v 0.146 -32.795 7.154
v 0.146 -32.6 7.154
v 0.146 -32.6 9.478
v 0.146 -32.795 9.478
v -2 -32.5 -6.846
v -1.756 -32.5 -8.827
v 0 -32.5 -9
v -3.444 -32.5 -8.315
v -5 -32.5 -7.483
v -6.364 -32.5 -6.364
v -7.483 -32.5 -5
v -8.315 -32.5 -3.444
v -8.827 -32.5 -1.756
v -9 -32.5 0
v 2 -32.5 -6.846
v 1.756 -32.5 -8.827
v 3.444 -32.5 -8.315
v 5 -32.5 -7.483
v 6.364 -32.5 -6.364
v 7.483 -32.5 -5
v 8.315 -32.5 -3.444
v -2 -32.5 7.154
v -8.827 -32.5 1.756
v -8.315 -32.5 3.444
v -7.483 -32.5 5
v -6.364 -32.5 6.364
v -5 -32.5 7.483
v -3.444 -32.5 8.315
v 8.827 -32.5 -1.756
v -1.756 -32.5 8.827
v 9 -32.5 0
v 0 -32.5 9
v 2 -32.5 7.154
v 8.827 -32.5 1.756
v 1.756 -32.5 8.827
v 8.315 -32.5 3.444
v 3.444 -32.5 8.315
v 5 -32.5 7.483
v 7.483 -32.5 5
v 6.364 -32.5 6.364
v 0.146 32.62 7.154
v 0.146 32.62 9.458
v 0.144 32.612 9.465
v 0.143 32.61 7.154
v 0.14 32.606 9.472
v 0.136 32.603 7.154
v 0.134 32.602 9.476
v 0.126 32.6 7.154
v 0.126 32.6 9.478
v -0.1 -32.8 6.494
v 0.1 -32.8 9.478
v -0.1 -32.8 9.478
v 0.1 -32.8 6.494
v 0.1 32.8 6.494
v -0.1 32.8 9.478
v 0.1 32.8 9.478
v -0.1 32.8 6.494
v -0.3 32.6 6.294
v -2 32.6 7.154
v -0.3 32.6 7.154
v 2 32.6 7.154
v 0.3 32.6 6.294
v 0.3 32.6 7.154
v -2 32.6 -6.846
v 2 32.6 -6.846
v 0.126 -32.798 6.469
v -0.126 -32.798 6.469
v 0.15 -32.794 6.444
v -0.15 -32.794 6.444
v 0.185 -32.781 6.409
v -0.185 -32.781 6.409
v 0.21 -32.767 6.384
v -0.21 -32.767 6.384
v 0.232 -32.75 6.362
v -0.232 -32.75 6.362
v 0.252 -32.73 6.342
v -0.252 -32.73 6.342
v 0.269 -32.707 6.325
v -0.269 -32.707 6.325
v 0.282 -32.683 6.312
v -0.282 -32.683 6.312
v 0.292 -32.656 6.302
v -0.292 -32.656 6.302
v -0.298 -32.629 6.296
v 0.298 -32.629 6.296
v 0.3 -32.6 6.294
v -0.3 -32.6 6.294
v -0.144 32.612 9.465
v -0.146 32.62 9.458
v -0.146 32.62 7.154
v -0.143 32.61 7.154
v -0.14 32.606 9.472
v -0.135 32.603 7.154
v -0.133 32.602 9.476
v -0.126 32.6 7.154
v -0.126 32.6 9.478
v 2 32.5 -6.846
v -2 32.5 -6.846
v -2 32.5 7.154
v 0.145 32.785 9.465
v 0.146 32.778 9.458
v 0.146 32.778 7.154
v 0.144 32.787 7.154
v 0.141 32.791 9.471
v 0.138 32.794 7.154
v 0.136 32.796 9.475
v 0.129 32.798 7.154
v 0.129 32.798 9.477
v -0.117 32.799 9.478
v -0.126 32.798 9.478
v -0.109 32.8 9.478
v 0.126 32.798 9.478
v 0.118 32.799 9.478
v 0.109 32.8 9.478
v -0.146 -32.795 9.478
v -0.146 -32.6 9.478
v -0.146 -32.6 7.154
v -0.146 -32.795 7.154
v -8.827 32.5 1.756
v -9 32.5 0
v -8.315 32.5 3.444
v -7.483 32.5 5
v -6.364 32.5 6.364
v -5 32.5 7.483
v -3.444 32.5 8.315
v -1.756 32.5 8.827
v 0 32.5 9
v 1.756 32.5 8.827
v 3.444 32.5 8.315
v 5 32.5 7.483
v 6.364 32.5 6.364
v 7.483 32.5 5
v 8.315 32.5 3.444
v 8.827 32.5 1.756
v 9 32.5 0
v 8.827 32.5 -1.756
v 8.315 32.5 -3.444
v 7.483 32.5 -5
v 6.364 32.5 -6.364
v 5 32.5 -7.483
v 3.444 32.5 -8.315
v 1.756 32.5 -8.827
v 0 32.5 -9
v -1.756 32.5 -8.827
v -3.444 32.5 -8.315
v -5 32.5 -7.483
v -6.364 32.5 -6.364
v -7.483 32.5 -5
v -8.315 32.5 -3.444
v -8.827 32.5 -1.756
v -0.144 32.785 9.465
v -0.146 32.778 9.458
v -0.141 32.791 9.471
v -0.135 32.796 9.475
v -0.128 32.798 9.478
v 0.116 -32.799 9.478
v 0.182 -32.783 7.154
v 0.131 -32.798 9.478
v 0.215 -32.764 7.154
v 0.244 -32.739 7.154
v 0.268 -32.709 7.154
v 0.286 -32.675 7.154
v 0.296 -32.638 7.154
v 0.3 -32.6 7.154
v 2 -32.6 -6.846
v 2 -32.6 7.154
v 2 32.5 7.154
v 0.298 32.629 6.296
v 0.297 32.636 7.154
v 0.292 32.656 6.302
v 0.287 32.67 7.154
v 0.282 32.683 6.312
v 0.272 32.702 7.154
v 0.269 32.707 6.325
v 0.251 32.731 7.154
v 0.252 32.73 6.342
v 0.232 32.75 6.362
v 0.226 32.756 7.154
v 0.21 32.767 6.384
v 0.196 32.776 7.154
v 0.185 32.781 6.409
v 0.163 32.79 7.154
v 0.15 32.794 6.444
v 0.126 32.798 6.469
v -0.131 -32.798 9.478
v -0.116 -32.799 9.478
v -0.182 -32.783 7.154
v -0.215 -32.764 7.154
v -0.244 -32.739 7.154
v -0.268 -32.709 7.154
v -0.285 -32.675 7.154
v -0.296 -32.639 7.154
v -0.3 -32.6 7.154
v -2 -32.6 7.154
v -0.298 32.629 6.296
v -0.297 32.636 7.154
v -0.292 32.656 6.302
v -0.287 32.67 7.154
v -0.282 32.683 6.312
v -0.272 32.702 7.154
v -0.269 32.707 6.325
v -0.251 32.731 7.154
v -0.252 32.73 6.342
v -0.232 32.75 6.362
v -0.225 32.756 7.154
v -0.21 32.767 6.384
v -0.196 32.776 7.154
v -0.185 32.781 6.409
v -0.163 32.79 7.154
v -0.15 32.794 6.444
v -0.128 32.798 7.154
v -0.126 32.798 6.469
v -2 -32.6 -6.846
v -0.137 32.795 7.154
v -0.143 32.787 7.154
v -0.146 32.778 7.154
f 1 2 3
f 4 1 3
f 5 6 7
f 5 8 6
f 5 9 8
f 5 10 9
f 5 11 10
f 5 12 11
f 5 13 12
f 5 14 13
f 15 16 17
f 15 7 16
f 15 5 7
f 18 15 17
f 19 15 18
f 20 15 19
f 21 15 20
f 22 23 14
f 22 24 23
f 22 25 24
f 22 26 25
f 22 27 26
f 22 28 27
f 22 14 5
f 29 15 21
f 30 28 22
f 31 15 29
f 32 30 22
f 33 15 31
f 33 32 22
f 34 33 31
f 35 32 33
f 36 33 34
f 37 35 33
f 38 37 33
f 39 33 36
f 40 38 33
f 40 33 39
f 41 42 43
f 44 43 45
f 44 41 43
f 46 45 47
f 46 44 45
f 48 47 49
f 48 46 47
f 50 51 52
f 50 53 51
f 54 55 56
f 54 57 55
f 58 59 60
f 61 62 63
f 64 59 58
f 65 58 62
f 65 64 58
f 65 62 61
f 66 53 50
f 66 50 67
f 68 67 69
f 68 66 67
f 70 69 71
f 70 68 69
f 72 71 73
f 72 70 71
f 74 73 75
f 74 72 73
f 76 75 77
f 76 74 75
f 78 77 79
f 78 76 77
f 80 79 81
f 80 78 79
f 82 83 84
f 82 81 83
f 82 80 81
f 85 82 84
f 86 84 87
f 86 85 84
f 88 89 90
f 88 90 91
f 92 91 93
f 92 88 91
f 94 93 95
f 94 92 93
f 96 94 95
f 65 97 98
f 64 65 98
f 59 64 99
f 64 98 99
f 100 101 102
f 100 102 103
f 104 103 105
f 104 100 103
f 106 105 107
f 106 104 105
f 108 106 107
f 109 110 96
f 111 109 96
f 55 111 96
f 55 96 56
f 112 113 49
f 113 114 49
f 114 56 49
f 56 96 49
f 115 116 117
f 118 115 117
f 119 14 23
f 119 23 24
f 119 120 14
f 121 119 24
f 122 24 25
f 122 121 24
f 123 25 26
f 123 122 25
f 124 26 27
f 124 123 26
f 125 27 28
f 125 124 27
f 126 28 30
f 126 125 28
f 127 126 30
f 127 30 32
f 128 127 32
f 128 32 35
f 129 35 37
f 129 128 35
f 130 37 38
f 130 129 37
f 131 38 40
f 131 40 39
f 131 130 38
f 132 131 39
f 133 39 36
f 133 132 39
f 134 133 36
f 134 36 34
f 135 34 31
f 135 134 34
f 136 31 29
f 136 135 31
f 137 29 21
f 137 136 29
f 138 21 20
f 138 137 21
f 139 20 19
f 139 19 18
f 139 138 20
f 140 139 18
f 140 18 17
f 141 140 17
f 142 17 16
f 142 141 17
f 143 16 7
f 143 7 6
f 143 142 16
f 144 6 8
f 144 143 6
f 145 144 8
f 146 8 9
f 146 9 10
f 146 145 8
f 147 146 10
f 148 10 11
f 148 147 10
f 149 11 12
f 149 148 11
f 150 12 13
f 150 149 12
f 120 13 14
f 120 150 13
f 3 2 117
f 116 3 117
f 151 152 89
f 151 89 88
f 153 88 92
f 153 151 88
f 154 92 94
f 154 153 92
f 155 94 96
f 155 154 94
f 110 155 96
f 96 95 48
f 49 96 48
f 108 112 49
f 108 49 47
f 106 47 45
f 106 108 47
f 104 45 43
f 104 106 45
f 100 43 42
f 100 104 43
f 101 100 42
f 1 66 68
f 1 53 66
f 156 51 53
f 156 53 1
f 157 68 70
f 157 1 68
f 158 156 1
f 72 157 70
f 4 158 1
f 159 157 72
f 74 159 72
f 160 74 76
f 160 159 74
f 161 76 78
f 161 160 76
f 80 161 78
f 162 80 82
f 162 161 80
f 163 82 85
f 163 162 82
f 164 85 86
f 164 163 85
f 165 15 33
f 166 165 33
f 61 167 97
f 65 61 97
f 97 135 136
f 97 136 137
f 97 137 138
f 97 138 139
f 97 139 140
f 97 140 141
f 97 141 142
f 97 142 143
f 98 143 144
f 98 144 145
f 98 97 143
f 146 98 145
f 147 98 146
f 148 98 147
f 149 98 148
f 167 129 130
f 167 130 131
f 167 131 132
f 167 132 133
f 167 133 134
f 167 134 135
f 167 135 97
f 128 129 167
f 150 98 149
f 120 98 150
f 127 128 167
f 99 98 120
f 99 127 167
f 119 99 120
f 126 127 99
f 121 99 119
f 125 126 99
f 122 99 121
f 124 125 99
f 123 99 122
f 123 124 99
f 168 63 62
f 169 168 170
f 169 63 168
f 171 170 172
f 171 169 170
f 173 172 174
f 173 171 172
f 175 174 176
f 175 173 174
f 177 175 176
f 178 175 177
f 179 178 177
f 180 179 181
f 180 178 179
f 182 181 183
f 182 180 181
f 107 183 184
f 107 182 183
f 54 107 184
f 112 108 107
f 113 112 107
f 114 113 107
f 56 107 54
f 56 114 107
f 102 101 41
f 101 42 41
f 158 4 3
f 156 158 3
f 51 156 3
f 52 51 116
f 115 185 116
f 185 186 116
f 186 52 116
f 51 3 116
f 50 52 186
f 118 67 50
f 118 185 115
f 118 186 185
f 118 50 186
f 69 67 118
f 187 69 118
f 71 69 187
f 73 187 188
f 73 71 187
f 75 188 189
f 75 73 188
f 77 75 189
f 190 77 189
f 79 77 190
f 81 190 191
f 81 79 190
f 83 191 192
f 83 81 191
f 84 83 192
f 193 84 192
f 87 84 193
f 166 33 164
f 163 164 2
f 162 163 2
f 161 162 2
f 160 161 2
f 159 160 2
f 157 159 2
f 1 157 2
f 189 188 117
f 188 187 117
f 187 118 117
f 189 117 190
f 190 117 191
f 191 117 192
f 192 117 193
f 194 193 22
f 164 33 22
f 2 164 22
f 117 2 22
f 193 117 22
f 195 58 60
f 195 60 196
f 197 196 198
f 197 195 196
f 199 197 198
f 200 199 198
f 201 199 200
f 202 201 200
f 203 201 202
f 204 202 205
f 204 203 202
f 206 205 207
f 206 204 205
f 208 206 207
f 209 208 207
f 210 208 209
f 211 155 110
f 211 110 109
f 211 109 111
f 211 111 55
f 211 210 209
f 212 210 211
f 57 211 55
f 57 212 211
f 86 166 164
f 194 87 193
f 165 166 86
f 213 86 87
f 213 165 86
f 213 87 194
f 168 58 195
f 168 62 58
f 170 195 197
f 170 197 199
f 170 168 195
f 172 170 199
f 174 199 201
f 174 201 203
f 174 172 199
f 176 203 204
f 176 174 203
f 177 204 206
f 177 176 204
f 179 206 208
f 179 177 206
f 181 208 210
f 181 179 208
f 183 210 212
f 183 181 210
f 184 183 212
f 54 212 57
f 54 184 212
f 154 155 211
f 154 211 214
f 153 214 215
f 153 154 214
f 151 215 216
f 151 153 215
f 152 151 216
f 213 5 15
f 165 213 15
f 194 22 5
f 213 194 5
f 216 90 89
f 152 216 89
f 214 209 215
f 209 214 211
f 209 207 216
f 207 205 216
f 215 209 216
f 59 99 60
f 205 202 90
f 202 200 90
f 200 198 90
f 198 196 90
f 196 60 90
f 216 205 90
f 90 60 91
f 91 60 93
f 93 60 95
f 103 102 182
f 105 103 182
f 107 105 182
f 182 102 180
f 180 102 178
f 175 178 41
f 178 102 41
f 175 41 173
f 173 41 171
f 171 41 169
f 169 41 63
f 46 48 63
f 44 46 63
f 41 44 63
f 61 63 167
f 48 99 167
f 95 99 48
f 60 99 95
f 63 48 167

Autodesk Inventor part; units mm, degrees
ref_plane "YZ Plane" through (0, 0, 0) normal (1, 0, 0) x (0, 1, 0)
ref_plane "XZ Plane" through (0, 0, 0) normal (0, 1, 0) x (-1, 0, 0)
ref_plane "XY Plane" through (0, 0, 0) normal (0, 0, 1) x (1, 0, 0)
sketch "Boceto1" plane through (0, 0, 0) normal (0, 1, 0) x (-1, 0, 0)
  circle A0 centre (0, 0) radius 9
extrude "Extrusión1" add sketch "Boceto1" along normal blind 32.5
sketch "Boceto3" plane through (0, 32.5, 0) normal (0, 1, 0) x (1, 0, 0)
  line L0 (-2, -7.1538) -> (2, -7.1538)
  line L1 (2, -7.1538) -> (2, 6.8462)
  line L2 (2, 6.8462) -> (-2, 6.8462)
  line L3 (-2, 6.8462) -> (-2, -7.1538)
  point P0 (0, 0)
extrude "Extrusión2" add sketch "Boceto3" along normal blind 0.1
sketch "Boceto4" plane through (0, 32.6, 0) normal (0, 1, 0) x (1, 0, 0)
  line L0 (-2, -7.1538) -> (2, -7.1538) projected
  line L1 (-0.3, -7.1538) -> (-0.3, -6.2942)
  line L2 (-0.3, -6.2942) -> (0.3, -6.2942)
  line L3 (0.3, -6.2942) -> (0.3, -7.1538)
  line L4 (-0.1455, -7.1538) -> (-0.1455, -9.4777)
  line L5 (-0.1455, -9.4777) -> (0.146, -9.4777)
  line L6 (0.146, -9.4777) -> (0.146, -7.1538)
  line L7 (-0.3, -7.1538) -> (-0.1455, -7.1538)
  line L8 (0.146, -7.1538) -> (0.3, -7.1538)
  point P0 (0, 0)
extrude "Extrusión3" add sketch "Boceto4" along normal blind 0.2
fillet "Empalme1" radius 0.2 3 edges at (-0.3, 32.8, 6.724) (0.3, 32.8, 6.724) (0, 32.8, 6.2942)
fillet "Empalme2" radius 0.02 6 edges at (-0.1455, 32.6974, 9.4777) (0.146, 32.6974, 9.4777) (-0.1455, 32.6, 8.3158) (0.146, 32.6, 8.3158) (0.146, 32.7947, 8.3158) (-0.1455, 32.7949, 8.3158)
mirror "Simetría1" about plane through (0, 0, 0) normal (0, -1, 0) of "Extrusión1", "Extrusión3", "Extrusión2", "Empalme1"
equation "\"Radio_pliegue\" = Grosor"
equation "\"Anchura_desahogo_plegado\" = Grosor"
equation "\"Profundidad_desahogo_plegado\" = 0.5 * Grosor"
equation "\"Tamaño_destalonado\" = 4 * Grosor"
equation "\"Remanente_mínimo\" = 2 * Grosor"
equation "\"Radiodetransición\" = Radio_pliegue"
equation "\"Tamaño_de_radio_de_Jacobi\" = Radio_pliegue"
equation "\"TamañoSeparación\" = Grosor"
equation "\"Grosor\" = 0.5"
properties part number "pila"
